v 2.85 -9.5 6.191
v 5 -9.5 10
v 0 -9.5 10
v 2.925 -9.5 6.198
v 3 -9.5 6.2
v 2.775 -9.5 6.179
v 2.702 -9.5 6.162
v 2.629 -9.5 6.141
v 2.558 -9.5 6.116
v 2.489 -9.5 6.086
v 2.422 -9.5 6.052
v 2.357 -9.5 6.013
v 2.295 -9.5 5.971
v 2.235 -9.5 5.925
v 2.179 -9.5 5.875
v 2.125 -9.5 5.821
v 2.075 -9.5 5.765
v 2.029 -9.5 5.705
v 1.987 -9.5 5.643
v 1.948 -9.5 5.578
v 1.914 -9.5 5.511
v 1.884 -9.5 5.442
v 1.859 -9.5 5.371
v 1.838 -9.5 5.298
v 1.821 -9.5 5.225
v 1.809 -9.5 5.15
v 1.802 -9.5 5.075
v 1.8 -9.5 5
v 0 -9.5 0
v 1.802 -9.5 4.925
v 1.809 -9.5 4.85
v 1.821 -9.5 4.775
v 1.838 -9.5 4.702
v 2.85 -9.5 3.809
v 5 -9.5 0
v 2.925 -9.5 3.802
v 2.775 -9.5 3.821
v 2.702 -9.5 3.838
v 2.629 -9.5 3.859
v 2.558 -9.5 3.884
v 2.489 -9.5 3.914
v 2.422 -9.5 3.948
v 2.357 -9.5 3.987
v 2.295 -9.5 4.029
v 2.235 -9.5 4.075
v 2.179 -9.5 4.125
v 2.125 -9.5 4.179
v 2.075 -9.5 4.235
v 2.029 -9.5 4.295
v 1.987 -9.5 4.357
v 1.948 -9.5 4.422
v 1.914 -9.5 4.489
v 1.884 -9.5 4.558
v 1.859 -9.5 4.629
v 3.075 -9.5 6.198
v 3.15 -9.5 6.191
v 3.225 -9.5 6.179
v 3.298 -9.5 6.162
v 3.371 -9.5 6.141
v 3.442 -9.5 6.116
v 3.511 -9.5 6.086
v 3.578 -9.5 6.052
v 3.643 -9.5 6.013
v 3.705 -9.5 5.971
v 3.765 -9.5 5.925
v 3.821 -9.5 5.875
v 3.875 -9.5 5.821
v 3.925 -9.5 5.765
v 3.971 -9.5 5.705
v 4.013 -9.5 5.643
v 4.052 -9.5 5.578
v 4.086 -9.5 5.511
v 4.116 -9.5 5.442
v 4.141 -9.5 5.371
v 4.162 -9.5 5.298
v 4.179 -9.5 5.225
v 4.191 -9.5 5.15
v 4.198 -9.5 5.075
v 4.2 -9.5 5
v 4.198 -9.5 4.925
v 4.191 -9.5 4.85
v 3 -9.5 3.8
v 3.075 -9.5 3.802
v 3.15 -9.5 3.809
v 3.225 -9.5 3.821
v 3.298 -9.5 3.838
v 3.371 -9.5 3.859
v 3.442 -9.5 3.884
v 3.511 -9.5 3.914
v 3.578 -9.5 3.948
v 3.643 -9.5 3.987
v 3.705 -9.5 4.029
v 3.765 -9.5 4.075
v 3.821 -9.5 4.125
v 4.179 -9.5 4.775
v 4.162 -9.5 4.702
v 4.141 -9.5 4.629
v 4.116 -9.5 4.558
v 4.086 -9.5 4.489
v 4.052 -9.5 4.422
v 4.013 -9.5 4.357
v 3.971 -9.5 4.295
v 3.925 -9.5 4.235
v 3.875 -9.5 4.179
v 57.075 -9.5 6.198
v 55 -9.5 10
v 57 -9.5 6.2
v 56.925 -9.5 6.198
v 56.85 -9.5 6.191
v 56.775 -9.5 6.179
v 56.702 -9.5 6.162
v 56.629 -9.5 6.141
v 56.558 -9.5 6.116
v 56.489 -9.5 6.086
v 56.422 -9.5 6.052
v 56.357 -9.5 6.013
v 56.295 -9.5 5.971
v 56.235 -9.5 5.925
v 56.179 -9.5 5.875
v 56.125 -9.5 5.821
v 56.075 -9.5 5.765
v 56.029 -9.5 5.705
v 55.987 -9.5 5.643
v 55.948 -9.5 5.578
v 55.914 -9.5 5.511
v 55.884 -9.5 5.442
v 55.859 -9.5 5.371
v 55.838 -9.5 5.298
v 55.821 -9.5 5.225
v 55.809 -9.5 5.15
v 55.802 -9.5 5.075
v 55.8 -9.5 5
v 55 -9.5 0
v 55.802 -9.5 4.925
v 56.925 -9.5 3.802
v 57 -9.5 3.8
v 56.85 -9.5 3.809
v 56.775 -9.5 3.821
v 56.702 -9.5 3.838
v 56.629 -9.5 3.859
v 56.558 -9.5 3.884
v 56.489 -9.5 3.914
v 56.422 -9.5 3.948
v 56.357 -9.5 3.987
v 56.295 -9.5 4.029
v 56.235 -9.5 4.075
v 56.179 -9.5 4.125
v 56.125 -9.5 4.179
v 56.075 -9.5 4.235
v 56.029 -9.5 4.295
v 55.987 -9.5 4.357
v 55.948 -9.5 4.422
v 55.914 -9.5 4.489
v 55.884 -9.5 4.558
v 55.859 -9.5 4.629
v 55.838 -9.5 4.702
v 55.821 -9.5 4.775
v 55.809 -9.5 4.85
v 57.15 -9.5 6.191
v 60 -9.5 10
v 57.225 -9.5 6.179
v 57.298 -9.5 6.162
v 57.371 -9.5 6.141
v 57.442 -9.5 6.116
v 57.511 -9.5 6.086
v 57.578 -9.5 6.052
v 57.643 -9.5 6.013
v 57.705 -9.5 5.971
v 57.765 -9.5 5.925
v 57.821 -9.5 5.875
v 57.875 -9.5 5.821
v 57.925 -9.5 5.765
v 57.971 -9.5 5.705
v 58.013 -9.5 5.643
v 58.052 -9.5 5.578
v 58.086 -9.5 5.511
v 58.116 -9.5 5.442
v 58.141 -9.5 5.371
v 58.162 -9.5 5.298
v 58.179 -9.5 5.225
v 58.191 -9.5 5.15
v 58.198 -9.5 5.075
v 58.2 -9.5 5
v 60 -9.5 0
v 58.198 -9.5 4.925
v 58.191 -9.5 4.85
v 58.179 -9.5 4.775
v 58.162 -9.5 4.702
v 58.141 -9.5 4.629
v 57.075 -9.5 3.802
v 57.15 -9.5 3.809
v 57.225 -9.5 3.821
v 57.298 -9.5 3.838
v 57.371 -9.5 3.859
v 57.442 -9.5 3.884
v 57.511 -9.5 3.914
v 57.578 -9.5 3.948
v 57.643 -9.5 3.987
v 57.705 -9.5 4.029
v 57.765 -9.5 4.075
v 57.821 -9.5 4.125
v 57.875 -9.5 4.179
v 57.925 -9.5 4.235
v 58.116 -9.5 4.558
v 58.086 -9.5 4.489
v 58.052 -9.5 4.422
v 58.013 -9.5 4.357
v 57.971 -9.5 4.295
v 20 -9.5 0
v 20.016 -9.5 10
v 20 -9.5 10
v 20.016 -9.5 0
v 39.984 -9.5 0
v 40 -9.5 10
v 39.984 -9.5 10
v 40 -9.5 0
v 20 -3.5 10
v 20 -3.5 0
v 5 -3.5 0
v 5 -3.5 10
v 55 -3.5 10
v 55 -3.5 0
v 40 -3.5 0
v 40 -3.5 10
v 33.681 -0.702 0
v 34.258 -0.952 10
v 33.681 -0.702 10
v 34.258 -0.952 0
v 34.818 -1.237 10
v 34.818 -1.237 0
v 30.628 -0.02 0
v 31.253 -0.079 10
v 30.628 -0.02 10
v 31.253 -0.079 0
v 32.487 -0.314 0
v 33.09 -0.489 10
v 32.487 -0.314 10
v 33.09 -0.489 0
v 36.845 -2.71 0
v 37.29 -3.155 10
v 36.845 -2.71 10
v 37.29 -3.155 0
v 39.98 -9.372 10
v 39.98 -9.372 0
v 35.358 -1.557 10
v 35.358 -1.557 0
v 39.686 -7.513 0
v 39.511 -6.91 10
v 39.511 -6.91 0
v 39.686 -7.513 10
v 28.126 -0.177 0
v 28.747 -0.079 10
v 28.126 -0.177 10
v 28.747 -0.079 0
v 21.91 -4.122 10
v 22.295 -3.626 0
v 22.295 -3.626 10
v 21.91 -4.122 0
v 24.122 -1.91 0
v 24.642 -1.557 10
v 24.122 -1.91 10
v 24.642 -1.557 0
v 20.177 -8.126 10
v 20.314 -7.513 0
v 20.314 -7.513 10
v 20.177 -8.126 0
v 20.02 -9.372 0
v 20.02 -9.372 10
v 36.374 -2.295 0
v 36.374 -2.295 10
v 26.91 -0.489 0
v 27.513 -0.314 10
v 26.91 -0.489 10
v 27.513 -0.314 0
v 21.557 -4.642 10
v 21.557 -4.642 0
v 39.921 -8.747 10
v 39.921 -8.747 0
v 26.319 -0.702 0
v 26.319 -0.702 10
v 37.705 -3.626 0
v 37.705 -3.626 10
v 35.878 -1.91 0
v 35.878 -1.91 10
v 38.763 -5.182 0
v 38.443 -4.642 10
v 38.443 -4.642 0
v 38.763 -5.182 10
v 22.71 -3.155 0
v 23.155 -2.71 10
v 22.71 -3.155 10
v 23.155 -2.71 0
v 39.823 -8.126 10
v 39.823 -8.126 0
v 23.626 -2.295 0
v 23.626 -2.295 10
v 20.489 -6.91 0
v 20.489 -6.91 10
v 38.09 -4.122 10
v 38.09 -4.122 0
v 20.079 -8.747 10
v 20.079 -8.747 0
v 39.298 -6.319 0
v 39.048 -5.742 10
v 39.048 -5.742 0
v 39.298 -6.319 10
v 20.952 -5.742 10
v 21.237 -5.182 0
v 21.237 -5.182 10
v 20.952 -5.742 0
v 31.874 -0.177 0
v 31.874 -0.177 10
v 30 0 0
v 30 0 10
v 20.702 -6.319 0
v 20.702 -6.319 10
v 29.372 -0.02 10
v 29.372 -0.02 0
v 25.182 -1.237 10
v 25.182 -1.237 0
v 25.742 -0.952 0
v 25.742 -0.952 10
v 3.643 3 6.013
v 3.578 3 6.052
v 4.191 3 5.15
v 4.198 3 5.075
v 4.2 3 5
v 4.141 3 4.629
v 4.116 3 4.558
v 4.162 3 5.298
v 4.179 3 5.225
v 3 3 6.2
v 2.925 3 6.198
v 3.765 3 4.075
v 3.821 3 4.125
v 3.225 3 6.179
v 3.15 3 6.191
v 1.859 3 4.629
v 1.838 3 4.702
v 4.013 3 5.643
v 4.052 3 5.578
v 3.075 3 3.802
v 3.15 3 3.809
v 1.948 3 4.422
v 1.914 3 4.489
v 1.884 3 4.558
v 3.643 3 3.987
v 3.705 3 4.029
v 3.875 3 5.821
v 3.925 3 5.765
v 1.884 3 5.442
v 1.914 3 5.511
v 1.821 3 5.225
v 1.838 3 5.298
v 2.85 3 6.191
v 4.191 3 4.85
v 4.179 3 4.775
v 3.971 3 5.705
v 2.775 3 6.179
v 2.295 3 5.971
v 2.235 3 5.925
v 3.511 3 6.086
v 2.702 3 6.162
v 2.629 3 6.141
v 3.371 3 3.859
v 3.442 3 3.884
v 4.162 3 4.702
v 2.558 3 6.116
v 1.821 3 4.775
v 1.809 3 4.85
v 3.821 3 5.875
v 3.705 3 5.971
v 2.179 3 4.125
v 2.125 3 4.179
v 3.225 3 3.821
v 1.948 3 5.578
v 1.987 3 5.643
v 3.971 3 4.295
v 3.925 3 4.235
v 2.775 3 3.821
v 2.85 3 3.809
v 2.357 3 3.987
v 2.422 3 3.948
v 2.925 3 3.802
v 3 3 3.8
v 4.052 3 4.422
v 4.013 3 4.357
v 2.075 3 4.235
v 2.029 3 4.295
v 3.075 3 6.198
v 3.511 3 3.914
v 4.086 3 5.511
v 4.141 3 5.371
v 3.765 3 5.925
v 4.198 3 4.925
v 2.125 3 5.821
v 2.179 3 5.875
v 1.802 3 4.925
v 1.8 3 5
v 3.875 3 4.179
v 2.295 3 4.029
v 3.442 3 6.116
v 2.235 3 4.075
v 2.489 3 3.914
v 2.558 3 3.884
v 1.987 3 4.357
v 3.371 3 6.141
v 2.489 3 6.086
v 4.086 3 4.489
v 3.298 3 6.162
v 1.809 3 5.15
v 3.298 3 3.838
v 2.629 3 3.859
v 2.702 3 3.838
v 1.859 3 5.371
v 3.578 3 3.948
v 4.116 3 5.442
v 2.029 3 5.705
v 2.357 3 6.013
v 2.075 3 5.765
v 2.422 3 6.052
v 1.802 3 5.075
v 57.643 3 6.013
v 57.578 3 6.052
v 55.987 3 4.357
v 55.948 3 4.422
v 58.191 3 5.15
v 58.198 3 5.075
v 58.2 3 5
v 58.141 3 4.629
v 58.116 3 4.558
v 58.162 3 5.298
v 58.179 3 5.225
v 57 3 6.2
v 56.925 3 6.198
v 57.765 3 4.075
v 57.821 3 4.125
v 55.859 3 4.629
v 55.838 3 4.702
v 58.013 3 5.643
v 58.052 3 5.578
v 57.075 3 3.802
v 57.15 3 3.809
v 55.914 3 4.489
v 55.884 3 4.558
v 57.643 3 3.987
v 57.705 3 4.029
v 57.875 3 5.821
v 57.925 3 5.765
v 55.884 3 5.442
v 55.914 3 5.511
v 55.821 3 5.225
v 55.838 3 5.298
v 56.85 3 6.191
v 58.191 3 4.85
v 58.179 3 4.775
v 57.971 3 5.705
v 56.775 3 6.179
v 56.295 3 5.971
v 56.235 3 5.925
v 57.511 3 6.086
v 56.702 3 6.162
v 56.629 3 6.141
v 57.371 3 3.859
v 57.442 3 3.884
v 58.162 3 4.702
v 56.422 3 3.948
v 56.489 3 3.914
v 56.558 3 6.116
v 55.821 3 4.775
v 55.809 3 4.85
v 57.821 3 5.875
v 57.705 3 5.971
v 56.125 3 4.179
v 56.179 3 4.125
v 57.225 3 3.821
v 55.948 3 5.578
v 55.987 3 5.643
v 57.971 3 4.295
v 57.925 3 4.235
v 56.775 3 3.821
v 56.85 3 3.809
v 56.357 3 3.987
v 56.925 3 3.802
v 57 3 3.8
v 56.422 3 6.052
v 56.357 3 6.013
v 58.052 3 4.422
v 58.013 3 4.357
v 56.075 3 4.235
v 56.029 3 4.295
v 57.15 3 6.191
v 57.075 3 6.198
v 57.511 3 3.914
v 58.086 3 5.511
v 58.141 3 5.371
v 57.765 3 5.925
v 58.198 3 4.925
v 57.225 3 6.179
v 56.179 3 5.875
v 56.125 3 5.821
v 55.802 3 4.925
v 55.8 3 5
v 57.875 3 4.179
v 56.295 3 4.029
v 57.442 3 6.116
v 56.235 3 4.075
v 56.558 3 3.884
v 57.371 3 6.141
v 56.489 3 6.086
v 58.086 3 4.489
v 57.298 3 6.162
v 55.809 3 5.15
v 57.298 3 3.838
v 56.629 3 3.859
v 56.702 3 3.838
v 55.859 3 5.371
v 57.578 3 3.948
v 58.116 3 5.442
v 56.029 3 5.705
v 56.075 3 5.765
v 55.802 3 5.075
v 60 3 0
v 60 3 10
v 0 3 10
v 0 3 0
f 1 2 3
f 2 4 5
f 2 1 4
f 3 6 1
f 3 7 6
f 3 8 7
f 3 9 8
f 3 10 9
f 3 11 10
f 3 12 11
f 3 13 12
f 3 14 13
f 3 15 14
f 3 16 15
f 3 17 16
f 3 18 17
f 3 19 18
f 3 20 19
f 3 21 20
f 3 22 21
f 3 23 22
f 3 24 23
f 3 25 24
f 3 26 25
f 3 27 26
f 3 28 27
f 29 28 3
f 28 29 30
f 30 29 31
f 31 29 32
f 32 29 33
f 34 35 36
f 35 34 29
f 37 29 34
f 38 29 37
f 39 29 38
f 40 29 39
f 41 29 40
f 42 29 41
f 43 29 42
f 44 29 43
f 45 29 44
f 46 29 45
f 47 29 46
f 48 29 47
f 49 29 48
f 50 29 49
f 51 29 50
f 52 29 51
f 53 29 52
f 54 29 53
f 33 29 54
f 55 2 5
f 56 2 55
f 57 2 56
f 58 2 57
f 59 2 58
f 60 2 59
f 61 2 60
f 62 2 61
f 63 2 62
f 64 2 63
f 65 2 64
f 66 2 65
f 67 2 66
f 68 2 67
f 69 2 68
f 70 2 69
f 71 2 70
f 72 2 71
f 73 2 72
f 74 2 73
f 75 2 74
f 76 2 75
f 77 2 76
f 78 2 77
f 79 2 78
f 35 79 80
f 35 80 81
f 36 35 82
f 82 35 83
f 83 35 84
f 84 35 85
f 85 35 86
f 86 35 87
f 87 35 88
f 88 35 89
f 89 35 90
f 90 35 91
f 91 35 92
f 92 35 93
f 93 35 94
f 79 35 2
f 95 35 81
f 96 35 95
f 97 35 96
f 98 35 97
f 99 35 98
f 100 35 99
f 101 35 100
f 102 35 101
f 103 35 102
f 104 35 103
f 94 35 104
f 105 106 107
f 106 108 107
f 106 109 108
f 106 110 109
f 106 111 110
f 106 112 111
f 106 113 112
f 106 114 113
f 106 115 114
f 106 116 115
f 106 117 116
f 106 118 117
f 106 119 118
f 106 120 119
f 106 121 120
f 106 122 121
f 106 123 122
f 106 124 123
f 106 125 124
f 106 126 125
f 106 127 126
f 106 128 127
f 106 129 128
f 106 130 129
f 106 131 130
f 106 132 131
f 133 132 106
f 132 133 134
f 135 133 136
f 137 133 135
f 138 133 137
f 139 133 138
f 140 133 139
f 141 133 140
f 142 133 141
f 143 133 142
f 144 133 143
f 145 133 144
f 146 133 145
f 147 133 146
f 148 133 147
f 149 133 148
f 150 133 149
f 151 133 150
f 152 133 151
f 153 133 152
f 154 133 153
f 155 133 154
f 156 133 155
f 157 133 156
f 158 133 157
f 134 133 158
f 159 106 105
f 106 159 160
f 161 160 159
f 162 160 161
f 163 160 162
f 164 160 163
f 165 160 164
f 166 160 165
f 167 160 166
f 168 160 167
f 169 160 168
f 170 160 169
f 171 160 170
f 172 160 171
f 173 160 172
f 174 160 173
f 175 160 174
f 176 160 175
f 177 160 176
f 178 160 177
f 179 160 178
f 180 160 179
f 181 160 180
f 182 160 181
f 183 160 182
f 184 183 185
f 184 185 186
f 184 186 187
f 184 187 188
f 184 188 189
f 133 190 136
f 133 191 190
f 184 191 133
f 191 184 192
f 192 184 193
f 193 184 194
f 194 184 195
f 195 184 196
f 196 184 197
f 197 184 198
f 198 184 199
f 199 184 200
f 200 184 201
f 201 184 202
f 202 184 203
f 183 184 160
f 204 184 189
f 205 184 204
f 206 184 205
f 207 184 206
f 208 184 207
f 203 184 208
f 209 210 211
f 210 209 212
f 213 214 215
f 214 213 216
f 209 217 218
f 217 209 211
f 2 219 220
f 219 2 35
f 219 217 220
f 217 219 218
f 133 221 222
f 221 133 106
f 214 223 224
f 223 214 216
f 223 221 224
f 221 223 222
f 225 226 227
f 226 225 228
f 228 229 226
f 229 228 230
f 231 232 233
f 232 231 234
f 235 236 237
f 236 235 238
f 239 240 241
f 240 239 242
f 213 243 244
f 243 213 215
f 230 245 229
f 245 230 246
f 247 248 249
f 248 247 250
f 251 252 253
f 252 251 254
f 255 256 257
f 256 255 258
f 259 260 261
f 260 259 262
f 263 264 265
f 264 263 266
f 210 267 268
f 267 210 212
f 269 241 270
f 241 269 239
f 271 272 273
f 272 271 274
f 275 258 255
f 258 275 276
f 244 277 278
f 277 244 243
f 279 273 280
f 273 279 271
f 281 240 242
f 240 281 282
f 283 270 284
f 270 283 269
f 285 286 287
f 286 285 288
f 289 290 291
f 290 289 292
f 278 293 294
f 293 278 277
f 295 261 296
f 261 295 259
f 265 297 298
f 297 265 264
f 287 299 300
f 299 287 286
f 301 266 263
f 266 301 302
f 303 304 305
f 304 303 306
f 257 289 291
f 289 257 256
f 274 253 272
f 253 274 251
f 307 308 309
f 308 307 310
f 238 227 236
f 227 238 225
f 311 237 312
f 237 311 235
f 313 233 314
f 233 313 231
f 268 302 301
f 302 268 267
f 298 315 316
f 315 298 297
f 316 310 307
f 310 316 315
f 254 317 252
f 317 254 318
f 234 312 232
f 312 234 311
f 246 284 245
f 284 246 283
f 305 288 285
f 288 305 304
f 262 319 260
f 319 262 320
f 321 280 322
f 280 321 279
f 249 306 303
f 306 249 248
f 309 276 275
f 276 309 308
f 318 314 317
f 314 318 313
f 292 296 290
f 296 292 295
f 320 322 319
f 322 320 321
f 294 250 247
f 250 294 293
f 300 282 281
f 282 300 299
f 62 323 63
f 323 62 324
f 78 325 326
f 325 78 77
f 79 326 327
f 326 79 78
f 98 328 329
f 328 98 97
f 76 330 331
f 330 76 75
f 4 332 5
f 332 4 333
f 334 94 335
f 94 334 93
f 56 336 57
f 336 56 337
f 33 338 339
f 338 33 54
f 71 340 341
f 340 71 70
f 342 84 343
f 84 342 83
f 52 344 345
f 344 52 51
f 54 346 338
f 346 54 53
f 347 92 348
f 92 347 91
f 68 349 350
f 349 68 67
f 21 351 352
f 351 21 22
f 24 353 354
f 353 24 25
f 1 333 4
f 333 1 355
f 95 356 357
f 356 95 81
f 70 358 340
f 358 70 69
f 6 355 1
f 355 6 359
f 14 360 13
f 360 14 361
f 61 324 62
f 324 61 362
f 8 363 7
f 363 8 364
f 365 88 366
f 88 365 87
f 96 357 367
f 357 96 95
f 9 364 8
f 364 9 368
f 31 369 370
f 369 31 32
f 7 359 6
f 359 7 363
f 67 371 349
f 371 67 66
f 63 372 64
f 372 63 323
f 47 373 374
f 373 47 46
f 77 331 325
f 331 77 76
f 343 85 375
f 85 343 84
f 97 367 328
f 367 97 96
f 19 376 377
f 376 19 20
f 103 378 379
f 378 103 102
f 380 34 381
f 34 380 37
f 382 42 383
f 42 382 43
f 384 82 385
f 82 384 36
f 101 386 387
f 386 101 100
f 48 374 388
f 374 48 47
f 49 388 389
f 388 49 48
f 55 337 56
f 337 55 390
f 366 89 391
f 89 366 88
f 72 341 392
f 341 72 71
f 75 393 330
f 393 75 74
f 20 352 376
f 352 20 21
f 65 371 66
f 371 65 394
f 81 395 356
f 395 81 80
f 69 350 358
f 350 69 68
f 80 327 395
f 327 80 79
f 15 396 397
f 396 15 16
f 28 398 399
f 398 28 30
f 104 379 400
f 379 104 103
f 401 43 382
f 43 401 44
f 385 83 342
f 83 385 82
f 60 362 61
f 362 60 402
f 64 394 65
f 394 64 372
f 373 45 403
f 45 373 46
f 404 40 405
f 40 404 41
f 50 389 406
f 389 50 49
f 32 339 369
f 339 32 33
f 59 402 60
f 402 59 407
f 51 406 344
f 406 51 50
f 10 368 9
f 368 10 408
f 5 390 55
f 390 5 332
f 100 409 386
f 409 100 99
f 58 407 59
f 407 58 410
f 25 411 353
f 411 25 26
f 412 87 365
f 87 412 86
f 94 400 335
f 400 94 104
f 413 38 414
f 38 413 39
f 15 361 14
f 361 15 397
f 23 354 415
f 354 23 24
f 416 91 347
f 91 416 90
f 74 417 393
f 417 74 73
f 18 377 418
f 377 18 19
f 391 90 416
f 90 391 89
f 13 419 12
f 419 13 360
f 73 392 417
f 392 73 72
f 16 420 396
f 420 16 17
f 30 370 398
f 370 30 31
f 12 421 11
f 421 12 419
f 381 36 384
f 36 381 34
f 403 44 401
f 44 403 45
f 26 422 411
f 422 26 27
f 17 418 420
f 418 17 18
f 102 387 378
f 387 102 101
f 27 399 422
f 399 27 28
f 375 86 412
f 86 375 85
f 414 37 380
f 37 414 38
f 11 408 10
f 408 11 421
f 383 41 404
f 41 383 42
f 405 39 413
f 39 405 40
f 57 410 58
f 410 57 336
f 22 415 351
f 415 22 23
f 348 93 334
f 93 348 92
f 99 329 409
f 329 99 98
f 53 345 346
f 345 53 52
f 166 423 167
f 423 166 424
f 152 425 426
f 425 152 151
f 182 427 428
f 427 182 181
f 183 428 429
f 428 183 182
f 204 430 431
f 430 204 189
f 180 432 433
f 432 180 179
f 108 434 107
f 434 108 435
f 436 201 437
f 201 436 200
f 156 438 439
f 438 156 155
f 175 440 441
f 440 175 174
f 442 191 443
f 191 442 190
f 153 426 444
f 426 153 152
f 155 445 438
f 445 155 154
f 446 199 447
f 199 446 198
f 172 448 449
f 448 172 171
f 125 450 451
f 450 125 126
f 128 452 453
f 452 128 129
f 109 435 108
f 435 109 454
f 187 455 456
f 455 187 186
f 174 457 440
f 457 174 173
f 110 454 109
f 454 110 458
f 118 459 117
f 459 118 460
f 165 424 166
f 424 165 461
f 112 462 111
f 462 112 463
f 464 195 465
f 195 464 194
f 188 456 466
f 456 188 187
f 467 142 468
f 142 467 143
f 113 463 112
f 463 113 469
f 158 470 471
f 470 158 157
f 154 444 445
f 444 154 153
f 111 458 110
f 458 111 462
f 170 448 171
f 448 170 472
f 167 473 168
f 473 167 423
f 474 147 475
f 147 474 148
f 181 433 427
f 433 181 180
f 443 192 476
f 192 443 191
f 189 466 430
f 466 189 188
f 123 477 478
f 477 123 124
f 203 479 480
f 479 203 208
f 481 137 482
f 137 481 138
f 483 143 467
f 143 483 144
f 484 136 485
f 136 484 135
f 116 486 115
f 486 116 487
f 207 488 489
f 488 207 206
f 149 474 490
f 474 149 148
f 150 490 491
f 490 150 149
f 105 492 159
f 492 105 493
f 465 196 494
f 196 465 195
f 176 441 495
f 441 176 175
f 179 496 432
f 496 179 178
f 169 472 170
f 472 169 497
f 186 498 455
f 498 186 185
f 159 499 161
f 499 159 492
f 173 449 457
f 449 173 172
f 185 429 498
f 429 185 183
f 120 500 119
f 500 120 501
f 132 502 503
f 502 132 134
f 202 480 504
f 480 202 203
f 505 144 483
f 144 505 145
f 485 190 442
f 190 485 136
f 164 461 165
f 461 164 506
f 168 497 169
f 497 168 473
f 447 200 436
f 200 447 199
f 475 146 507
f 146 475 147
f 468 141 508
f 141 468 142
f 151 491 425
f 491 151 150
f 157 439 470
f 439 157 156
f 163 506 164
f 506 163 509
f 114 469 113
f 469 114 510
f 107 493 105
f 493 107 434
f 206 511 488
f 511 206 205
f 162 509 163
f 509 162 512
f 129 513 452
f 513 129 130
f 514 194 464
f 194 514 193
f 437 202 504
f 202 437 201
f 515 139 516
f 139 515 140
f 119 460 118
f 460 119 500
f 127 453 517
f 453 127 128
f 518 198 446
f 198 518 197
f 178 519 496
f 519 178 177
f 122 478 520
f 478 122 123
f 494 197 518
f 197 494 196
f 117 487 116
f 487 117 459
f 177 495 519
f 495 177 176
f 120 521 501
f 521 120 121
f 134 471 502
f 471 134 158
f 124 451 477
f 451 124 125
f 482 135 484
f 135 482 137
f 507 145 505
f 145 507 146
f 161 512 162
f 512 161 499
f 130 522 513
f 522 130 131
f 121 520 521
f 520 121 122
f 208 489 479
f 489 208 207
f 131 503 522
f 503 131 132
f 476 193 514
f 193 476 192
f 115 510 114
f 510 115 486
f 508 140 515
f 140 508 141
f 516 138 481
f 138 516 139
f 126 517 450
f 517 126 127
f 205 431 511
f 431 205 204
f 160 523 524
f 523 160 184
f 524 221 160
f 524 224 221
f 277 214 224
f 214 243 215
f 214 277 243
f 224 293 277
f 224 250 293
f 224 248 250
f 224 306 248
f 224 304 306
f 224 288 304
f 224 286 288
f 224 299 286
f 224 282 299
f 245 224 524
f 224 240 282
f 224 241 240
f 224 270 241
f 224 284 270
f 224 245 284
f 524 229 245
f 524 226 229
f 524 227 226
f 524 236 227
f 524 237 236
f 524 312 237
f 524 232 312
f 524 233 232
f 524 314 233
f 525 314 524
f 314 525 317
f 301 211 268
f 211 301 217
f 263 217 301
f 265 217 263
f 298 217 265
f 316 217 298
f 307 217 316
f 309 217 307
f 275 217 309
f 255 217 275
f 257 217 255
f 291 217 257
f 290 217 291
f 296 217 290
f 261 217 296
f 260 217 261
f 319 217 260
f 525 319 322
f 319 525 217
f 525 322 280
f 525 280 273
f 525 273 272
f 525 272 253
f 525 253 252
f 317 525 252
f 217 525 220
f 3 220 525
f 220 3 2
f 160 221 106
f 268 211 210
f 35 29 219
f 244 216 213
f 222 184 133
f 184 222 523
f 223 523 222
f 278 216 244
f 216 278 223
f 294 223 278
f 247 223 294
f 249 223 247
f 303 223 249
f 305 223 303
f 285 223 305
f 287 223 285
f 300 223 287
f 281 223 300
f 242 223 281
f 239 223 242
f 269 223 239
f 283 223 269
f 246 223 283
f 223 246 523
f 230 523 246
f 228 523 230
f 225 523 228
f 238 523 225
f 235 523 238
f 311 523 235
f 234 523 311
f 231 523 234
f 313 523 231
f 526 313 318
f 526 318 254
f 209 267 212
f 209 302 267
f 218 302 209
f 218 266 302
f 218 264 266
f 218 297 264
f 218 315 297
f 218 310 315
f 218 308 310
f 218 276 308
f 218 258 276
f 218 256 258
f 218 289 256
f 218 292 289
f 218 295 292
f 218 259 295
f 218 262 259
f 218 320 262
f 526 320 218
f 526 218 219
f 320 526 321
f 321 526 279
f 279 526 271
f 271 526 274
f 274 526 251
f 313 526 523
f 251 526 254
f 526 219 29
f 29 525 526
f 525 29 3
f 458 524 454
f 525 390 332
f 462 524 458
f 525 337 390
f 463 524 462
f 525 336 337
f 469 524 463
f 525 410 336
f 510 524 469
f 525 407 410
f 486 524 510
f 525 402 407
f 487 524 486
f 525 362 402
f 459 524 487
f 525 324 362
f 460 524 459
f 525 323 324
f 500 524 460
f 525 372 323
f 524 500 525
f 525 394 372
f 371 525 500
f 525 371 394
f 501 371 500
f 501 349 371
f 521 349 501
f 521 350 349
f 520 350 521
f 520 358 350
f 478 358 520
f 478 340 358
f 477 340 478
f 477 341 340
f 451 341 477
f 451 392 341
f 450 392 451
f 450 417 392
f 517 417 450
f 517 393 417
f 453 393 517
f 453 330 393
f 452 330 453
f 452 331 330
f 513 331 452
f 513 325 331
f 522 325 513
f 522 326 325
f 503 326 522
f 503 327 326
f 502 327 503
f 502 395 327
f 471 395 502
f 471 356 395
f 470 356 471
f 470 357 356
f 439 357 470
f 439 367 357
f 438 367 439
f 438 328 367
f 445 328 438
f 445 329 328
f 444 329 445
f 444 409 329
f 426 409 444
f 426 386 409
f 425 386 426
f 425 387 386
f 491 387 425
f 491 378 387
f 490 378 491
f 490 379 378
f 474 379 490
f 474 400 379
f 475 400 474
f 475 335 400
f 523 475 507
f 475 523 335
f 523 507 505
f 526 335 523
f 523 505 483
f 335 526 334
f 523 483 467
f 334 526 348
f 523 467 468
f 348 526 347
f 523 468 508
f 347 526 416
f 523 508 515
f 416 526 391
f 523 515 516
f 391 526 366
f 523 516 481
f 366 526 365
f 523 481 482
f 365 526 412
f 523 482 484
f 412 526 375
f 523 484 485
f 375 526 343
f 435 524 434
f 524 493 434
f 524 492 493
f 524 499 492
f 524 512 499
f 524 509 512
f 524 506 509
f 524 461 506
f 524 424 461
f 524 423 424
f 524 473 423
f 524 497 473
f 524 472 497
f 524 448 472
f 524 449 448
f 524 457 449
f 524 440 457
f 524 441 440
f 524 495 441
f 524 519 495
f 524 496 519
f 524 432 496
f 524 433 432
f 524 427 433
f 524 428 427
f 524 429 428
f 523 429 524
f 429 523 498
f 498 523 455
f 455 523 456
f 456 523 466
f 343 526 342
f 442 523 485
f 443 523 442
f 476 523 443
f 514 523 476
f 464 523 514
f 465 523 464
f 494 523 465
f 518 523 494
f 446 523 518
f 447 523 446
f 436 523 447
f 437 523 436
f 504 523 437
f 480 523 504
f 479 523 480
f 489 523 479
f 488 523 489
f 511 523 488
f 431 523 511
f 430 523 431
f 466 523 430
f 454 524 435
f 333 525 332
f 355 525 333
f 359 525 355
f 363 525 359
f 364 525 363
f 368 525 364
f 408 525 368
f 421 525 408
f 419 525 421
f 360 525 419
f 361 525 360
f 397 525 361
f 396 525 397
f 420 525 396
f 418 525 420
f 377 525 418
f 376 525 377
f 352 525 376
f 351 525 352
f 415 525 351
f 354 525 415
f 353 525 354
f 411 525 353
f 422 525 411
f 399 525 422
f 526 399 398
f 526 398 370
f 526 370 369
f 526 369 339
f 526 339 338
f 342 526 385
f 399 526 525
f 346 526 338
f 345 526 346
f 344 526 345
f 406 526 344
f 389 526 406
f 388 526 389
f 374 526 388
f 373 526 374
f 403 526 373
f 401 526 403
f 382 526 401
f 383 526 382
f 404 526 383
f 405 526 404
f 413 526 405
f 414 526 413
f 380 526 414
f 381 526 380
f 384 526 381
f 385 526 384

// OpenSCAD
mirror(v= [0,180,0] ) {
difference(){
	union(){
        translate([0,-3,0]){
           cube([60,20,10], center=false);
        }

   
 
	}
	union() {
        translate([-1,9.5,-5]){
           cube([62,20,20], center=false);
        }

        translate([5,(20-13)/2,-1]){
           cube([15,13,20], center=false);
        }
        translate([40,(20-13)/2,-1]){
           cube([15,13,20], center=false);
        }
        translate([30,10,-1]){
            rotate([0,0,90]){
                cylinder(h=30, r=10, $fn=100, center=true);
            }
        }
        translate([3,0,5]){
            rotate([90,0,0]){
                cylinder(h=300, r=1.2, $fn=100, center=true);
            }
        }
        translate([60-3,0,5]){
            rotate([90,0,0]){
                cylinder(h=300, r=1.2, $fn=100, center=true);
            }
        }


	}
}
}
